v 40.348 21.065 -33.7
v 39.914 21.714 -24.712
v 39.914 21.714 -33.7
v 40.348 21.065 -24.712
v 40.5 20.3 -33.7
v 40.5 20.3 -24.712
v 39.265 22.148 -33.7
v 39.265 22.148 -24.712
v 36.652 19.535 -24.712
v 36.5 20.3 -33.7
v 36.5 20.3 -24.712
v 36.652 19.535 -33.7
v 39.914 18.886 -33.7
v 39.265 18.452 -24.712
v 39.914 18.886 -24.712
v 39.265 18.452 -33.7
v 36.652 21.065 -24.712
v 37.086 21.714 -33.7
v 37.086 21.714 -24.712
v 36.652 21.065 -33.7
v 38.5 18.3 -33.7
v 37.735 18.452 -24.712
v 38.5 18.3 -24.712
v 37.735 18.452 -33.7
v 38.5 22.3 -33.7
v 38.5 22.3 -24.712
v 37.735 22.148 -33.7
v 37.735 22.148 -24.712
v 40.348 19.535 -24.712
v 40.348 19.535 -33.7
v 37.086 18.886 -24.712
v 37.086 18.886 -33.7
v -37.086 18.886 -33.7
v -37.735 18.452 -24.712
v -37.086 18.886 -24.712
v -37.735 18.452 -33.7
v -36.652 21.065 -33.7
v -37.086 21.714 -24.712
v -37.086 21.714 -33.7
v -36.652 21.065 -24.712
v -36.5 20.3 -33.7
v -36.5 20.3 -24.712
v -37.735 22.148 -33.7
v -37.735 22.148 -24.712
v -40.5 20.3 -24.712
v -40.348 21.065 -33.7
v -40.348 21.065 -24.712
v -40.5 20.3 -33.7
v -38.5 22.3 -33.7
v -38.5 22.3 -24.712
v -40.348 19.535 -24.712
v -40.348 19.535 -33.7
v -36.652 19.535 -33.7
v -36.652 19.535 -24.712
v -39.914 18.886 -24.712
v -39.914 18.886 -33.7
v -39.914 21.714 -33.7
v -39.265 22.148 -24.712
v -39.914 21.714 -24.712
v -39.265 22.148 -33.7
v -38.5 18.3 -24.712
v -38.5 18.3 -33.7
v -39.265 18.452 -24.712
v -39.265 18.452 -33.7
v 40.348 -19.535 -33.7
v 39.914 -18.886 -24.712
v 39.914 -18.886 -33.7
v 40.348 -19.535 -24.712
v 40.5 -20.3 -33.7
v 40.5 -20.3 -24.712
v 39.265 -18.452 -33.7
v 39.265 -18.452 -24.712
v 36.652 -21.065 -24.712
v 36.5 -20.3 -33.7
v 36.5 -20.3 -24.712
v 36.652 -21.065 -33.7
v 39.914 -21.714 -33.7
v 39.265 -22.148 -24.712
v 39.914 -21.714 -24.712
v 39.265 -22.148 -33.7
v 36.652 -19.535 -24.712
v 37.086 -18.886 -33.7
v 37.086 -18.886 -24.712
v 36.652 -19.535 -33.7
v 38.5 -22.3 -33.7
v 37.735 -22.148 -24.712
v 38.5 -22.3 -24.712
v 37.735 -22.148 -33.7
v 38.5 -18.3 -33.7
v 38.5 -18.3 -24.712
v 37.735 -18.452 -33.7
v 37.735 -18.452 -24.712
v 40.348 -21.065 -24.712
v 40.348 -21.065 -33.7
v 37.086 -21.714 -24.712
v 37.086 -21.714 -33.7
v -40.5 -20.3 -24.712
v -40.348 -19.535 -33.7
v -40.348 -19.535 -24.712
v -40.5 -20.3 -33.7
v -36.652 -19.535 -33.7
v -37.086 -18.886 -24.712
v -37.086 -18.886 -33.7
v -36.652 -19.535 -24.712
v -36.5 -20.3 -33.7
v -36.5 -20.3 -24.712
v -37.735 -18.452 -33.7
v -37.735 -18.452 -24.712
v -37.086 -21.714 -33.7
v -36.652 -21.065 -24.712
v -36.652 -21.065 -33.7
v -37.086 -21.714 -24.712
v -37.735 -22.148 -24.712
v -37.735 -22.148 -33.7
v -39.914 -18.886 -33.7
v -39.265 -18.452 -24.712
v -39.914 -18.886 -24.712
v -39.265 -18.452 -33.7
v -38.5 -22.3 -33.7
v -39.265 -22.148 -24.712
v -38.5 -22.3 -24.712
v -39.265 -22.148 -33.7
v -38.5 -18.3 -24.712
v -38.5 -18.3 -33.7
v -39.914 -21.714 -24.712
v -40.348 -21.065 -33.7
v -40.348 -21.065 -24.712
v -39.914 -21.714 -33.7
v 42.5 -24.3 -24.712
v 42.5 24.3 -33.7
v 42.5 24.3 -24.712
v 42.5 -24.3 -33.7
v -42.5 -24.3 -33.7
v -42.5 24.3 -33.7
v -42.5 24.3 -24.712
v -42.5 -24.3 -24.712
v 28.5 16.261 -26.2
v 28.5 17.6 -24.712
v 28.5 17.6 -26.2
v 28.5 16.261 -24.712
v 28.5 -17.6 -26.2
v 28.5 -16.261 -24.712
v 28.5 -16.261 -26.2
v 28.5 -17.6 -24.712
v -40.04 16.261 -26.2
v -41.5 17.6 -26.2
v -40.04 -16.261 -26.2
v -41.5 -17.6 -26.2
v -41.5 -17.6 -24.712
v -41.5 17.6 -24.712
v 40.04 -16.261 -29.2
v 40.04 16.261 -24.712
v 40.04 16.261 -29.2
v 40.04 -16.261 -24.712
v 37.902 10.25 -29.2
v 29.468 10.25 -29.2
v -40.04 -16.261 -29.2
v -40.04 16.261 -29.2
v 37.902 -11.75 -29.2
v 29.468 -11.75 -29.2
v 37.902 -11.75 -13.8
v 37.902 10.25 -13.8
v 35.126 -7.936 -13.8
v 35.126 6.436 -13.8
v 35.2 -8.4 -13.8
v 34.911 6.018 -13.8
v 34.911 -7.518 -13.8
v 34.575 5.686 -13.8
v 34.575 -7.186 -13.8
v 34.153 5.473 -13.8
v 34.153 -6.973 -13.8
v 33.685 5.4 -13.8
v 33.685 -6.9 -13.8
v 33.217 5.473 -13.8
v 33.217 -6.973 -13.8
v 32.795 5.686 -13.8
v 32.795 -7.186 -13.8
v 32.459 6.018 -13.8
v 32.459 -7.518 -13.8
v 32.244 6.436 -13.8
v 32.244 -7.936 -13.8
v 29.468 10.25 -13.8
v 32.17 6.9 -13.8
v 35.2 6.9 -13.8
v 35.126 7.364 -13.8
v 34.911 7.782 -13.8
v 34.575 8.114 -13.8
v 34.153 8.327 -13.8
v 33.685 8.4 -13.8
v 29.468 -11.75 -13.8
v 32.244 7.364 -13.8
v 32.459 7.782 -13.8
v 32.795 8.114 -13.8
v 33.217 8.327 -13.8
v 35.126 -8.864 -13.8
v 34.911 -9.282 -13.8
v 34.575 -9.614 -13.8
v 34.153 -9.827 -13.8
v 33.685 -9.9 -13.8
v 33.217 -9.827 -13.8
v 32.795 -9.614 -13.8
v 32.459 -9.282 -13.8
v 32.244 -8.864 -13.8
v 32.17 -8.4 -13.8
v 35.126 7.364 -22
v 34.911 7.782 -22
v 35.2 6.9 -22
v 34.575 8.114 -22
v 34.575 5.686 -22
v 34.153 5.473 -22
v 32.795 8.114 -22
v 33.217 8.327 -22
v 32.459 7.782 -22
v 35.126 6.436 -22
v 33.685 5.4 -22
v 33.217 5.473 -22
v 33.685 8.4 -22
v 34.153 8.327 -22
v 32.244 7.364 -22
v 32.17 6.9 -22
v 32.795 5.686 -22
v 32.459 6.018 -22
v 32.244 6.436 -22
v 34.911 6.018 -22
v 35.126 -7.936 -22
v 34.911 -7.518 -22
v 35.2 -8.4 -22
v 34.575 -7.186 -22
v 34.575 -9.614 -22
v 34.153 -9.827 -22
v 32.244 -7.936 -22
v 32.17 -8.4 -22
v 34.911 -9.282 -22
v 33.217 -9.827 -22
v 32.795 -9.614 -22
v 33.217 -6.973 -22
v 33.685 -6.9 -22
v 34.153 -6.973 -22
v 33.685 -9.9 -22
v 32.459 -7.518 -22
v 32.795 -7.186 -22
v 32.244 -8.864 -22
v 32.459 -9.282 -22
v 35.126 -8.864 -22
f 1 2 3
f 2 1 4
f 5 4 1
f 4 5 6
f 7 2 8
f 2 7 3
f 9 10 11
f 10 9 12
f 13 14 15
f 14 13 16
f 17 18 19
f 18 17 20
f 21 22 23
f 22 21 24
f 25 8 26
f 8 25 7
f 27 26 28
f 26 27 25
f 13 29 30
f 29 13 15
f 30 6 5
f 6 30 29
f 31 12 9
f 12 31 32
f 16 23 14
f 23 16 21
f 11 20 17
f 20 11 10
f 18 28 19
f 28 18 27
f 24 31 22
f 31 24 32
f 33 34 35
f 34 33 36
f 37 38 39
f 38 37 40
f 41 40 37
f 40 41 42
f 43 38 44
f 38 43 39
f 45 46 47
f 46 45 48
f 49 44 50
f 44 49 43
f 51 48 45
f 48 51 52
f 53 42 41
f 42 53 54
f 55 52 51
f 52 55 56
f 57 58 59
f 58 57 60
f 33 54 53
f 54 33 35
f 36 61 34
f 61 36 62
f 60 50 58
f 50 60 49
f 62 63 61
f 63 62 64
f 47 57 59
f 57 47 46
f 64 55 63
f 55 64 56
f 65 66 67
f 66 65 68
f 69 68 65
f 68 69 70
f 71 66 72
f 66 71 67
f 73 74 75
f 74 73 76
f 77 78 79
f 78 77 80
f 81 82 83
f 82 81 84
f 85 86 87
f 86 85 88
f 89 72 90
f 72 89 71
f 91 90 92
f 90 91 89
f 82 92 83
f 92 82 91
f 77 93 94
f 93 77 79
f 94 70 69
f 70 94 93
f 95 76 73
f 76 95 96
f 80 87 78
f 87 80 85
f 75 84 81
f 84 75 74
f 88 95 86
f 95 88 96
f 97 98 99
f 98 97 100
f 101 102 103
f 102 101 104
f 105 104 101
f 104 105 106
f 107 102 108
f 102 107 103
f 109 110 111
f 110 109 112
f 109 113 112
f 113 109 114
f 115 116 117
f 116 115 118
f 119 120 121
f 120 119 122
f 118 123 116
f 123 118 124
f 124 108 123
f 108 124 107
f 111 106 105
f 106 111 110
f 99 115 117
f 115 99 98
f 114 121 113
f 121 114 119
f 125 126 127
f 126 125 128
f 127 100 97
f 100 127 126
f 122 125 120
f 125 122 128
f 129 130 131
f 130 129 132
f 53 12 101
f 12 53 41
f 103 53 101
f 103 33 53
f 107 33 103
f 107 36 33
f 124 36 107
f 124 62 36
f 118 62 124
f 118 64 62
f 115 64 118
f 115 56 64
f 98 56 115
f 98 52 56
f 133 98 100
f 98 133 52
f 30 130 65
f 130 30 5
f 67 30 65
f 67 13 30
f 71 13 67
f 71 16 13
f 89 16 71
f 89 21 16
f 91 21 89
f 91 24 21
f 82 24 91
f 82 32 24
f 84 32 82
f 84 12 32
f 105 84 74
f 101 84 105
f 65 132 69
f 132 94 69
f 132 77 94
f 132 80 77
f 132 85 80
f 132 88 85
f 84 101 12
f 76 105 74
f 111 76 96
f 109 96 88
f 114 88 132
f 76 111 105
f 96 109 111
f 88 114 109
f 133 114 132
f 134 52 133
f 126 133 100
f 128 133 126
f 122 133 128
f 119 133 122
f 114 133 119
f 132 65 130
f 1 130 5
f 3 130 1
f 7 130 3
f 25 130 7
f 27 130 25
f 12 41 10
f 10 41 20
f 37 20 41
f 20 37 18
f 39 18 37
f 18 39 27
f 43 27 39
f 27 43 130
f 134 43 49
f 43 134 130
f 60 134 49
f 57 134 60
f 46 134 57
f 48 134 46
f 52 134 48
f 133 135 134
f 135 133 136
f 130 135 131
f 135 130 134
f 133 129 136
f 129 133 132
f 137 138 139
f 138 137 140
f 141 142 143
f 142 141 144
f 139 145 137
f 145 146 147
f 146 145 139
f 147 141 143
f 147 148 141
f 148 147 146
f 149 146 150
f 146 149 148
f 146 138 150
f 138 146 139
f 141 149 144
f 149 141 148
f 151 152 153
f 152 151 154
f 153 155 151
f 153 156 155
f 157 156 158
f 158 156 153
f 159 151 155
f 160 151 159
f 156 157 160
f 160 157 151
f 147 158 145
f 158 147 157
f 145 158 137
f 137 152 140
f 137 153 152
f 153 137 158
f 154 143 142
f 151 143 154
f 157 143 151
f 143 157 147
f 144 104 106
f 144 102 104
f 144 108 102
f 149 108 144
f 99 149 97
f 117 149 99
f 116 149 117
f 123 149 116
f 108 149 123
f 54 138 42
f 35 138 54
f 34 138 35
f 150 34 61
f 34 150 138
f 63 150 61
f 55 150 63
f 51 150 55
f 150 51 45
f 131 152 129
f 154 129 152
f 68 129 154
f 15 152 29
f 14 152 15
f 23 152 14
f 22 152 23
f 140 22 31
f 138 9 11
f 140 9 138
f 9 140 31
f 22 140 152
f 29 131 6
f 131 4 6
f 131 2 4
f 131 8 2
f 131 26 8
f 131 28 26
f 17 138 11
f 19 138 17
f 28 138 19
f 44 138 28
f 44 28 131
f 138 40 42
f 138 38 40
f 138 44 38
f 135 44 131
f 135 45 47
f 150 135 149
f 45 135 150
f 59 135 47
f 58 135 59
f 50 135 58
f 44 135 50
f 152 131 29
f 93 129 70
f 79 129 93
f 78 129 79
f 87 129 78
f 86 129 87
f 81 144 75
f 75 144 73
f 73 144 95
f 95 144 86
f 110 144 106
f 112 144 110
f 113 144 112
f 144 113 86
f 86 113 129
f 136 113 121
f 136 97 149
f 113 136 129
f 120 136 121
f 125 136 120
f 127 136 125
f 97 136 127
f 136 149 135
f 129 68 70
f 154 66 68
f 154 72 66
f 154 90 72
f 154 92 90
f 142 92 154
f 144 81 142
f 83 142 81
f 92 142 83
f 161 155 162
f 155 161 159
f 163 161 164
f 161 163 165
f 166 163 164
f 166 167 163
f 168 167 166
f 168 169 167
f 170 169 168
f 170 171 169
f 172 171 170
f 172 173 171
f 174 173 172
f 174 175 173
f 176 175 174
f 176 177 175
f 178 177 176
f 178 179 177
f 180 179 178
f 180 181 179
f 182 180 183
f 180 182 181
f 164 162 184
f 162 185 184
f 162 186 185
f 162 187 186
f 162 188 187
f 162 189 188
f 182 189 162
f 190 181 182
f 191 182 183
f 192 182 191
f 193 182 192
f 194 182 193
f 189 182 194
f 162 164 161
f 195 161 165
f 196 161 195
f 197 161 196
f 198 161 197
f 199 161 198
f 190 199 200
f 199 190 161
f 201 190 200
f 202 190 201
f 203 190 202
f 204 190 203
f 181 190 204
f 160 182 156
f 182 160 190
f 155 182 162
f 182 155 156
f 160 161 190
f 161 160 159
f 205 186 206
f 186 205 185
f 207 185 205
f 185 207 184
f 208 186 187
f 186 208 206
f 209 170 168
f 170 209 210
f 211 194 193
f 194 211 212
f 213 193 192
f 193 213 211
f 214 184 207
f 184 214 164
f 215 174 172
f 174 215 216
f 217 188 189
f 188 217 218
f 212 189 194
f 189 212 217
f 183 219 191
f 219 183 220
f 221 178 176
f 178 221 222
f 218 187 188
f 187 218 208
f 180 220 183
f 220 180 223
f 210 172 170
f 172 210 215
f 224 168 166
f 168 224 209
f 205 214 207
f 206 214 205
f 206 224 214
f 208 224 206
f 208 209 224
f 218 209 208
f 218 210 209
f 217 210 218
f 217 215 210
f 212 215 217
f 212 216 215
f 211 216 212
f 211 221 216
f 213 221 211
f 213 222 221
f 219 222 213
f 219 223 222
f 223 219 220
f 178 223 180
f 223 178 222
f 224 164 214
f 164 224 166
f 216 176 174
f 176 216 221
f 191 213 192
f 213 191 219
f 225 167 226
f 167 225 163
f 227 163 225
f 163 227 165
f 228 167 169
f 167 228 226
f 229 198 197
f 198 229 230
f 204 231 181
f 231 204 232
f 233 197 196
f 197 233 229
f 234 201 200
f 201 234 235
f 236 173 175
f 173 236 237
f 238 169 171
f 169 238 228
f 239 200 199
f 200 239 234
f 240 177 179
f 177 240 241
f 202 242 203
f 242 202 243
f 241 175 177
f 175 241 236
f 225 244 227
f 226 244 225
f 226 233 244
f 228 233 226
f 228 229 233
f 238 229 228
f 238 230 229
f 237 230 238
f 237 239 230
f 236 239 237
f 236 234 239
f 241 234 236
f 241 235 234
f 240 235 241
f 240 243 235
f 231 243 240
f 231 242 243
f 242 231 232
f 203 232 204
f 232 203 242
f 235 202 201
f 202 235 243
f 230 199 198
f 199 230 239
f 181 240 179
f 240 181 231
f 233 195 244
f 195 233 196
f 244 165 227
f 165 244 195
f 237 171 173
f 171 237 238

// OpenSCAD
// file: bolt.scad
include <variables.scad>

bolt();

module bolt() {
	color("Silver")
	union() {
		for (i = [0:2]) {
			rotate([0, 0, 180/3*i])
			cube([boltWidth, boltSegmentWidth, boltHeight],center=true);
		}
	}
}
// file: box.scad
include <variables.scad>
use <bolt.scad>

CylinderPunchedBox(MaxLength, MinWidth, stickRadius-boxSpacing/2+batteryRadius*2+minEdgeWidth, holeRadius, holeRadius*2, true);

module HoledBox(length, width, height, holeRadius, holePadding, NutIndents) {
	difference() {
		cube([length, width, height], center = true);
		
		scale([1,1,1.001])
		union() { // subtractions
			// holes
			translate([
				 (length-holePadding-holeRadius*2)/2, 
				 (width-holePadding-holeRadius*2)/2, 
				-(height)/2])
			cylinder(height+.1, r=holeRadius, $fn=16);
			translate([
				-(length-holePadding-holeRadius*2)/2, 
				 (width-holePadding-holeRadius*2)/2, 
				-(height)/2])
			cylinder(height+.1, r=holeRadius, $fn=16);
			translate([
				 (length-holePadding-holeRadius*2)/2, 
				-(width-holePadding-holeRadius*2)/2, 
				-(height)/2])
			cylinder(height+.1, r=holeRadius, $fn=16);
			translate([
				-(length-holePadding-holeRadius*2)/2, 
				-(width-holePadding-holeRadius*2)/2, 
				-(height)/2])
			cylinder(height+.1, r=holeRadius, $fn=16);
		}

		if(NutIndents) {
			translate([0, 0, -(height-boltHeight+0.001)/2]) {
				translate([(length-holePadding-holeRadius*2)/2, (width-holePadding-holeRadius*2)/2, ])
				scale([1.05, 1.05, 1.1])
				bolt();
				translate([(length-holePadding-holeRadius*2)/2, -(width-holePadding-holeRadius*2)/2, ])
				scale([1.05, 1.05, 1.1])
				bolt();
				translate([-(length-holePadding-holeRadius*2)/2, (width-holePadding-holeRadius*2)/2, ])
				scale([1.05, 1.05, 1.1])
				bolt();
				translate([-(length-holePadding-holeRadius*2)/2, -(width-holePadding-holeRadius*2)/2, ])
				scale([1.05, 1.05, 1.1])
				bolt();
			}
		}
	}
}

module CylinderPunchedBox(length, width, height, holeRadius, holePadding, NutIndents) {
	difference() {
		translate([0, 0, -(height+boxSpacing)/2])
		HoledBox(length, width, height, holeRadius, holePadding, NutIndents);

		scale([1.001, 1, 1])
		rotate([0, 90, 0])
		cylinder((length), r=stickRadius, center=true, $fn=40);
	}
}
// file: pcb.scad
include <variables.scad>

PCB();

module PCB() {
	pinheaderHeight = PCBBoardToBoardHeight-2*PCBHeight;
	pinheaderLength = 38;
	pinheaderWidth = 2.4;
  color(alpha=0.5)
	translate([-(PCBLength-PCBBoardLength), 0, -(PCBBoardToBoardHeight)]) {
		color("Orange")
		translate([(PCBLength-PCBBoardLength)/2, 0, PCBHeight/2])
		cube([PCBBoardLength, PCBWidth, PCBHeight], center=true);
		
		translate([0, 0, PCBHeight]) {
			color("Grey") {
				translate([0, (PCBWidth-pinheaderWidth)/2-PCBNotchWidth, pinheaderHeight/2])
				cube([pinheaderLength, pinheaderWidth, pinheaderHeight], center=true);
				translate([0, -(PCBWidth-pinheaderWidth)/2+PCBNotchWidth, pinheaderHeight/2])
				cube([pinheaderLength, pinheaderWidth, pinheaderHeight], center=true);
			}
			color("Black")
			translate([0, 0, pinheaderHeight+PCBHeight/2])
			cube([55, 32.5, PCBHeight], center=true);

			color("Blue")
			translate([-PCBSensorBoardOverhang, PCBSensorBoardYOffset, 0])
			translate([PCBLength/2, 0, 0])
			translate([PCBSensorBoardLength/2, 0, pinheaderHeight+PCBHeight/2])
			difference() {
				cube([PCBSensorBoardLength, PCBSensorBoardWidth, PCBHeight], center=true);
				translate([PCBSensorBoardLength/2-1-PCBSensorBoardHoleRadius,  (PCBSensorBoardHoleCenterYDistance/2), 0])
				cylinder(10, r=PCBSensorBoardHoleRadius, center=true, $fn=20);
				translate([PCBSensorBoardLength/2-1-PCBSensorBoardHoleRadius, -(PCBSensorBoardHoleCenterYDistance/2), 0])
				cylinder(10, r=PCBSensorBoardHoleRadius, center=true, $fn=20);
			}
			
			color("Grey")
			translate([34, 0, pinheaderHeight/2])
			cube([pinheaderWidth, 20, pinheaderHeight], center=true);
		}
	}
}
// file: pcbBox.scad
include <variables.scad>
use <pcb.scad>
use <box.scad>

pcbBox();

module pcbBox() {
	difference() {
		CylinderPunchedBox(MaxLength, MinWidth, MinHeight, holeRadius, holeRadius*2);
		
		// Hollow out inside box space
		CutoutHeight = stickRadius+(PCBBoardToBoardHeight+PCBComponentsHeight)+PCBToBottomSpacing+PCBToTopSpacing;
		scale([1.001, 1.01, 1])
		translate([0, 0, -(CutoutHeight)/2])
		cube([PCBLength, PCBWidth-PCBNotchWidth*2, CutoutHeight], center=true);
		
		// PCB Notches cutout
		translate([-PCBNotchWidth, 0, -(stickRadius+PCBToTopSpacing+PCBComponentsHeight)])
		PCB();		

		// LED hole
		ledSmallRadius = 2;
		ledLargeRadius = 3;
		ledSmallHoleLength = 5;
		ledLargeHoleLength = ((MinWidth-(PCBWidth-PCBNotchWidth*2))/2)-ledSmallHoleLength;
		color("Green")
		translate([-PCBBoardLength/2+5, MinWidth/2, -(stickRadius)])
		rotate([90, 0, 0]){
			scale([1, 1, 1.01])
			translate([0, 0, -0.01])
			cylinder(ledSmallHoleLength, r=ledSmallRadius, center=false, $fn=20);
			translate([0, 0, ledSmallHoleLength])
			cylinder(ledLargeHoleLength, r=ledLargeRadius, center=false, $fn=20);
		}
	}
}
// file: variables.scad
innerWidth = 38;
innerLength = 80;
innerHeight = 25;
minEdgeWidth = 2.5;
largeEdgeWidth = 6;
holeRadius = 2;
boxSpacing = 4;
stickRadius = 7.1; // fixed by table

sensorScrewHoleRadius = 2.5/2;

// PCBVariables
	PCBWidth = 35.2;
	PCBBoardLength = 70;
	PCBLength = 80;// 70;
	PCBHeight = 1.5;
	PCBBoardToBoardHeight = 13.9; // height of the two layers of pcb and the pinheaders between them
	
	PCBToBottomSpacing = 3; // space for wires on bottom of PCB
	PCBToTopSpacing = 2; // Air gap between pcb components and stick
	PCBNotchWidth = 1.5; // user definable
	PCBComponentsHeight = 17.1-PCBBoardToBoardHeight; // Height of pCB components on top of top layer pcb

	PCBSensorBoardLength = 15.75;
	PCBSensorBoardWidth = 21;
	PCBSensorBoardOverhang = 7.4; // The length of sensor board that overhangs the main print board
	PCBSensorBoardYOffset = -1.5/2;
	PCBSensorBoardHoleRadius = 1.5;
	PCBSensorBoardHoleCenterYDistance = 12.3+PCBSensorBoardHoleRadius*2;

// BatteryBoxVariables
	batteryRadius = 18.3/2;
	batteryLenght = 65;

// Bolts
	boltHeight = 2.4;
	boltWidth = 5.4;
	boltSegmentWidth = 3.2;

// Switch
	SwitchBaseLength = 9.8;
	SwitchBaseWidth = 13.1;
	SwitchBaseHeight = 8;

	SwitchCylinderRadius = 6/2;
	SwitchCylinderLength = 9;
	SwitchLegLength = 4;

// switch_alt
	SwitchAltWidth = 13;
	SwitchAltHeight = 6;
	SwitchAltDepth = 6;
	SwitchPinLength = 4;
	SwitchAltFlipperHeight = 7;


MaxLength = 85; // fixed by table
MinWidth = max(batteryRadius*4, PCBWidth)+2*largeEdgeWidth;
MinHeight = max(batteryRadius*2, PCBToTopSpacing+PCBComponentsHeight+PCBBoardToBoardHeight+PCBToBottomSpacing)+stickRadius+minEdgeWidth;
// main file
include <variables.scad>
use <pcbBox.scad>

pcbBottomBox();

module pcbBottomBox() {
	union() {
		cutoffHeight = stickRadius+PCBToTopSpacing+PCBBoardToBoardHeight+PCBComponentsHeight-PCBHeight;
		difference() {
			pcbBox();
			
			// cutoff the top		
			translate([0, 0, -(cutoffHeight)/2])
			scale([1.001, 1.001, 1.001])
			cube([MaxLength, MinWidth, cutoffHeight], center=true);
		}
		// Sensor board support block
		{
			platformHeight = PCBToBottomSpacing+PCBBoardToBoardHeight-PCBHeight;
			platformLenght = PCBSensorBoardLength-PCBSensorBoardOverhang;
			platformWidth = PCBSensorBoardWidth*1.1;

			translate([0, 0, (platformHeight)/2])
			translate([0, 0, -(MinHeight-minEdgeWidth)])
			translate([-(PCBLength-PCBBoardLength+PCBNotchWidth), 0, 0])
			translate([(platformLenght/2), 0, 0])
			translate([PCBLength/2, 0, 0])
			translate([0, PCBSensorBoardYOffset, 0])
			scale([1.01, 1, 1])

			translate([1, 0, 0])
			difference() {
				cube([platformLenght, 22, platformHeight], center=true);

				translate([0, PCBSensorBoardHoleCenterYDistance/2, 3+2])
				cylinder(h=11, r=PCBSensorBoardHoleRadius, center=true, $fn=20);
				translate([0, -PCBSensorBoardHoleCenterYDistance/2, 3+2])
				cylinder(h=11, r=PCBSensorBoardHoleRadius, center=true, $fn=20);
			}
		}
	}

	// translate([-PCBNotchWidth, 0, -(stickRadius+PCBToTopSpacing+PCBComponentsHeight)])
	// PCB();
}
